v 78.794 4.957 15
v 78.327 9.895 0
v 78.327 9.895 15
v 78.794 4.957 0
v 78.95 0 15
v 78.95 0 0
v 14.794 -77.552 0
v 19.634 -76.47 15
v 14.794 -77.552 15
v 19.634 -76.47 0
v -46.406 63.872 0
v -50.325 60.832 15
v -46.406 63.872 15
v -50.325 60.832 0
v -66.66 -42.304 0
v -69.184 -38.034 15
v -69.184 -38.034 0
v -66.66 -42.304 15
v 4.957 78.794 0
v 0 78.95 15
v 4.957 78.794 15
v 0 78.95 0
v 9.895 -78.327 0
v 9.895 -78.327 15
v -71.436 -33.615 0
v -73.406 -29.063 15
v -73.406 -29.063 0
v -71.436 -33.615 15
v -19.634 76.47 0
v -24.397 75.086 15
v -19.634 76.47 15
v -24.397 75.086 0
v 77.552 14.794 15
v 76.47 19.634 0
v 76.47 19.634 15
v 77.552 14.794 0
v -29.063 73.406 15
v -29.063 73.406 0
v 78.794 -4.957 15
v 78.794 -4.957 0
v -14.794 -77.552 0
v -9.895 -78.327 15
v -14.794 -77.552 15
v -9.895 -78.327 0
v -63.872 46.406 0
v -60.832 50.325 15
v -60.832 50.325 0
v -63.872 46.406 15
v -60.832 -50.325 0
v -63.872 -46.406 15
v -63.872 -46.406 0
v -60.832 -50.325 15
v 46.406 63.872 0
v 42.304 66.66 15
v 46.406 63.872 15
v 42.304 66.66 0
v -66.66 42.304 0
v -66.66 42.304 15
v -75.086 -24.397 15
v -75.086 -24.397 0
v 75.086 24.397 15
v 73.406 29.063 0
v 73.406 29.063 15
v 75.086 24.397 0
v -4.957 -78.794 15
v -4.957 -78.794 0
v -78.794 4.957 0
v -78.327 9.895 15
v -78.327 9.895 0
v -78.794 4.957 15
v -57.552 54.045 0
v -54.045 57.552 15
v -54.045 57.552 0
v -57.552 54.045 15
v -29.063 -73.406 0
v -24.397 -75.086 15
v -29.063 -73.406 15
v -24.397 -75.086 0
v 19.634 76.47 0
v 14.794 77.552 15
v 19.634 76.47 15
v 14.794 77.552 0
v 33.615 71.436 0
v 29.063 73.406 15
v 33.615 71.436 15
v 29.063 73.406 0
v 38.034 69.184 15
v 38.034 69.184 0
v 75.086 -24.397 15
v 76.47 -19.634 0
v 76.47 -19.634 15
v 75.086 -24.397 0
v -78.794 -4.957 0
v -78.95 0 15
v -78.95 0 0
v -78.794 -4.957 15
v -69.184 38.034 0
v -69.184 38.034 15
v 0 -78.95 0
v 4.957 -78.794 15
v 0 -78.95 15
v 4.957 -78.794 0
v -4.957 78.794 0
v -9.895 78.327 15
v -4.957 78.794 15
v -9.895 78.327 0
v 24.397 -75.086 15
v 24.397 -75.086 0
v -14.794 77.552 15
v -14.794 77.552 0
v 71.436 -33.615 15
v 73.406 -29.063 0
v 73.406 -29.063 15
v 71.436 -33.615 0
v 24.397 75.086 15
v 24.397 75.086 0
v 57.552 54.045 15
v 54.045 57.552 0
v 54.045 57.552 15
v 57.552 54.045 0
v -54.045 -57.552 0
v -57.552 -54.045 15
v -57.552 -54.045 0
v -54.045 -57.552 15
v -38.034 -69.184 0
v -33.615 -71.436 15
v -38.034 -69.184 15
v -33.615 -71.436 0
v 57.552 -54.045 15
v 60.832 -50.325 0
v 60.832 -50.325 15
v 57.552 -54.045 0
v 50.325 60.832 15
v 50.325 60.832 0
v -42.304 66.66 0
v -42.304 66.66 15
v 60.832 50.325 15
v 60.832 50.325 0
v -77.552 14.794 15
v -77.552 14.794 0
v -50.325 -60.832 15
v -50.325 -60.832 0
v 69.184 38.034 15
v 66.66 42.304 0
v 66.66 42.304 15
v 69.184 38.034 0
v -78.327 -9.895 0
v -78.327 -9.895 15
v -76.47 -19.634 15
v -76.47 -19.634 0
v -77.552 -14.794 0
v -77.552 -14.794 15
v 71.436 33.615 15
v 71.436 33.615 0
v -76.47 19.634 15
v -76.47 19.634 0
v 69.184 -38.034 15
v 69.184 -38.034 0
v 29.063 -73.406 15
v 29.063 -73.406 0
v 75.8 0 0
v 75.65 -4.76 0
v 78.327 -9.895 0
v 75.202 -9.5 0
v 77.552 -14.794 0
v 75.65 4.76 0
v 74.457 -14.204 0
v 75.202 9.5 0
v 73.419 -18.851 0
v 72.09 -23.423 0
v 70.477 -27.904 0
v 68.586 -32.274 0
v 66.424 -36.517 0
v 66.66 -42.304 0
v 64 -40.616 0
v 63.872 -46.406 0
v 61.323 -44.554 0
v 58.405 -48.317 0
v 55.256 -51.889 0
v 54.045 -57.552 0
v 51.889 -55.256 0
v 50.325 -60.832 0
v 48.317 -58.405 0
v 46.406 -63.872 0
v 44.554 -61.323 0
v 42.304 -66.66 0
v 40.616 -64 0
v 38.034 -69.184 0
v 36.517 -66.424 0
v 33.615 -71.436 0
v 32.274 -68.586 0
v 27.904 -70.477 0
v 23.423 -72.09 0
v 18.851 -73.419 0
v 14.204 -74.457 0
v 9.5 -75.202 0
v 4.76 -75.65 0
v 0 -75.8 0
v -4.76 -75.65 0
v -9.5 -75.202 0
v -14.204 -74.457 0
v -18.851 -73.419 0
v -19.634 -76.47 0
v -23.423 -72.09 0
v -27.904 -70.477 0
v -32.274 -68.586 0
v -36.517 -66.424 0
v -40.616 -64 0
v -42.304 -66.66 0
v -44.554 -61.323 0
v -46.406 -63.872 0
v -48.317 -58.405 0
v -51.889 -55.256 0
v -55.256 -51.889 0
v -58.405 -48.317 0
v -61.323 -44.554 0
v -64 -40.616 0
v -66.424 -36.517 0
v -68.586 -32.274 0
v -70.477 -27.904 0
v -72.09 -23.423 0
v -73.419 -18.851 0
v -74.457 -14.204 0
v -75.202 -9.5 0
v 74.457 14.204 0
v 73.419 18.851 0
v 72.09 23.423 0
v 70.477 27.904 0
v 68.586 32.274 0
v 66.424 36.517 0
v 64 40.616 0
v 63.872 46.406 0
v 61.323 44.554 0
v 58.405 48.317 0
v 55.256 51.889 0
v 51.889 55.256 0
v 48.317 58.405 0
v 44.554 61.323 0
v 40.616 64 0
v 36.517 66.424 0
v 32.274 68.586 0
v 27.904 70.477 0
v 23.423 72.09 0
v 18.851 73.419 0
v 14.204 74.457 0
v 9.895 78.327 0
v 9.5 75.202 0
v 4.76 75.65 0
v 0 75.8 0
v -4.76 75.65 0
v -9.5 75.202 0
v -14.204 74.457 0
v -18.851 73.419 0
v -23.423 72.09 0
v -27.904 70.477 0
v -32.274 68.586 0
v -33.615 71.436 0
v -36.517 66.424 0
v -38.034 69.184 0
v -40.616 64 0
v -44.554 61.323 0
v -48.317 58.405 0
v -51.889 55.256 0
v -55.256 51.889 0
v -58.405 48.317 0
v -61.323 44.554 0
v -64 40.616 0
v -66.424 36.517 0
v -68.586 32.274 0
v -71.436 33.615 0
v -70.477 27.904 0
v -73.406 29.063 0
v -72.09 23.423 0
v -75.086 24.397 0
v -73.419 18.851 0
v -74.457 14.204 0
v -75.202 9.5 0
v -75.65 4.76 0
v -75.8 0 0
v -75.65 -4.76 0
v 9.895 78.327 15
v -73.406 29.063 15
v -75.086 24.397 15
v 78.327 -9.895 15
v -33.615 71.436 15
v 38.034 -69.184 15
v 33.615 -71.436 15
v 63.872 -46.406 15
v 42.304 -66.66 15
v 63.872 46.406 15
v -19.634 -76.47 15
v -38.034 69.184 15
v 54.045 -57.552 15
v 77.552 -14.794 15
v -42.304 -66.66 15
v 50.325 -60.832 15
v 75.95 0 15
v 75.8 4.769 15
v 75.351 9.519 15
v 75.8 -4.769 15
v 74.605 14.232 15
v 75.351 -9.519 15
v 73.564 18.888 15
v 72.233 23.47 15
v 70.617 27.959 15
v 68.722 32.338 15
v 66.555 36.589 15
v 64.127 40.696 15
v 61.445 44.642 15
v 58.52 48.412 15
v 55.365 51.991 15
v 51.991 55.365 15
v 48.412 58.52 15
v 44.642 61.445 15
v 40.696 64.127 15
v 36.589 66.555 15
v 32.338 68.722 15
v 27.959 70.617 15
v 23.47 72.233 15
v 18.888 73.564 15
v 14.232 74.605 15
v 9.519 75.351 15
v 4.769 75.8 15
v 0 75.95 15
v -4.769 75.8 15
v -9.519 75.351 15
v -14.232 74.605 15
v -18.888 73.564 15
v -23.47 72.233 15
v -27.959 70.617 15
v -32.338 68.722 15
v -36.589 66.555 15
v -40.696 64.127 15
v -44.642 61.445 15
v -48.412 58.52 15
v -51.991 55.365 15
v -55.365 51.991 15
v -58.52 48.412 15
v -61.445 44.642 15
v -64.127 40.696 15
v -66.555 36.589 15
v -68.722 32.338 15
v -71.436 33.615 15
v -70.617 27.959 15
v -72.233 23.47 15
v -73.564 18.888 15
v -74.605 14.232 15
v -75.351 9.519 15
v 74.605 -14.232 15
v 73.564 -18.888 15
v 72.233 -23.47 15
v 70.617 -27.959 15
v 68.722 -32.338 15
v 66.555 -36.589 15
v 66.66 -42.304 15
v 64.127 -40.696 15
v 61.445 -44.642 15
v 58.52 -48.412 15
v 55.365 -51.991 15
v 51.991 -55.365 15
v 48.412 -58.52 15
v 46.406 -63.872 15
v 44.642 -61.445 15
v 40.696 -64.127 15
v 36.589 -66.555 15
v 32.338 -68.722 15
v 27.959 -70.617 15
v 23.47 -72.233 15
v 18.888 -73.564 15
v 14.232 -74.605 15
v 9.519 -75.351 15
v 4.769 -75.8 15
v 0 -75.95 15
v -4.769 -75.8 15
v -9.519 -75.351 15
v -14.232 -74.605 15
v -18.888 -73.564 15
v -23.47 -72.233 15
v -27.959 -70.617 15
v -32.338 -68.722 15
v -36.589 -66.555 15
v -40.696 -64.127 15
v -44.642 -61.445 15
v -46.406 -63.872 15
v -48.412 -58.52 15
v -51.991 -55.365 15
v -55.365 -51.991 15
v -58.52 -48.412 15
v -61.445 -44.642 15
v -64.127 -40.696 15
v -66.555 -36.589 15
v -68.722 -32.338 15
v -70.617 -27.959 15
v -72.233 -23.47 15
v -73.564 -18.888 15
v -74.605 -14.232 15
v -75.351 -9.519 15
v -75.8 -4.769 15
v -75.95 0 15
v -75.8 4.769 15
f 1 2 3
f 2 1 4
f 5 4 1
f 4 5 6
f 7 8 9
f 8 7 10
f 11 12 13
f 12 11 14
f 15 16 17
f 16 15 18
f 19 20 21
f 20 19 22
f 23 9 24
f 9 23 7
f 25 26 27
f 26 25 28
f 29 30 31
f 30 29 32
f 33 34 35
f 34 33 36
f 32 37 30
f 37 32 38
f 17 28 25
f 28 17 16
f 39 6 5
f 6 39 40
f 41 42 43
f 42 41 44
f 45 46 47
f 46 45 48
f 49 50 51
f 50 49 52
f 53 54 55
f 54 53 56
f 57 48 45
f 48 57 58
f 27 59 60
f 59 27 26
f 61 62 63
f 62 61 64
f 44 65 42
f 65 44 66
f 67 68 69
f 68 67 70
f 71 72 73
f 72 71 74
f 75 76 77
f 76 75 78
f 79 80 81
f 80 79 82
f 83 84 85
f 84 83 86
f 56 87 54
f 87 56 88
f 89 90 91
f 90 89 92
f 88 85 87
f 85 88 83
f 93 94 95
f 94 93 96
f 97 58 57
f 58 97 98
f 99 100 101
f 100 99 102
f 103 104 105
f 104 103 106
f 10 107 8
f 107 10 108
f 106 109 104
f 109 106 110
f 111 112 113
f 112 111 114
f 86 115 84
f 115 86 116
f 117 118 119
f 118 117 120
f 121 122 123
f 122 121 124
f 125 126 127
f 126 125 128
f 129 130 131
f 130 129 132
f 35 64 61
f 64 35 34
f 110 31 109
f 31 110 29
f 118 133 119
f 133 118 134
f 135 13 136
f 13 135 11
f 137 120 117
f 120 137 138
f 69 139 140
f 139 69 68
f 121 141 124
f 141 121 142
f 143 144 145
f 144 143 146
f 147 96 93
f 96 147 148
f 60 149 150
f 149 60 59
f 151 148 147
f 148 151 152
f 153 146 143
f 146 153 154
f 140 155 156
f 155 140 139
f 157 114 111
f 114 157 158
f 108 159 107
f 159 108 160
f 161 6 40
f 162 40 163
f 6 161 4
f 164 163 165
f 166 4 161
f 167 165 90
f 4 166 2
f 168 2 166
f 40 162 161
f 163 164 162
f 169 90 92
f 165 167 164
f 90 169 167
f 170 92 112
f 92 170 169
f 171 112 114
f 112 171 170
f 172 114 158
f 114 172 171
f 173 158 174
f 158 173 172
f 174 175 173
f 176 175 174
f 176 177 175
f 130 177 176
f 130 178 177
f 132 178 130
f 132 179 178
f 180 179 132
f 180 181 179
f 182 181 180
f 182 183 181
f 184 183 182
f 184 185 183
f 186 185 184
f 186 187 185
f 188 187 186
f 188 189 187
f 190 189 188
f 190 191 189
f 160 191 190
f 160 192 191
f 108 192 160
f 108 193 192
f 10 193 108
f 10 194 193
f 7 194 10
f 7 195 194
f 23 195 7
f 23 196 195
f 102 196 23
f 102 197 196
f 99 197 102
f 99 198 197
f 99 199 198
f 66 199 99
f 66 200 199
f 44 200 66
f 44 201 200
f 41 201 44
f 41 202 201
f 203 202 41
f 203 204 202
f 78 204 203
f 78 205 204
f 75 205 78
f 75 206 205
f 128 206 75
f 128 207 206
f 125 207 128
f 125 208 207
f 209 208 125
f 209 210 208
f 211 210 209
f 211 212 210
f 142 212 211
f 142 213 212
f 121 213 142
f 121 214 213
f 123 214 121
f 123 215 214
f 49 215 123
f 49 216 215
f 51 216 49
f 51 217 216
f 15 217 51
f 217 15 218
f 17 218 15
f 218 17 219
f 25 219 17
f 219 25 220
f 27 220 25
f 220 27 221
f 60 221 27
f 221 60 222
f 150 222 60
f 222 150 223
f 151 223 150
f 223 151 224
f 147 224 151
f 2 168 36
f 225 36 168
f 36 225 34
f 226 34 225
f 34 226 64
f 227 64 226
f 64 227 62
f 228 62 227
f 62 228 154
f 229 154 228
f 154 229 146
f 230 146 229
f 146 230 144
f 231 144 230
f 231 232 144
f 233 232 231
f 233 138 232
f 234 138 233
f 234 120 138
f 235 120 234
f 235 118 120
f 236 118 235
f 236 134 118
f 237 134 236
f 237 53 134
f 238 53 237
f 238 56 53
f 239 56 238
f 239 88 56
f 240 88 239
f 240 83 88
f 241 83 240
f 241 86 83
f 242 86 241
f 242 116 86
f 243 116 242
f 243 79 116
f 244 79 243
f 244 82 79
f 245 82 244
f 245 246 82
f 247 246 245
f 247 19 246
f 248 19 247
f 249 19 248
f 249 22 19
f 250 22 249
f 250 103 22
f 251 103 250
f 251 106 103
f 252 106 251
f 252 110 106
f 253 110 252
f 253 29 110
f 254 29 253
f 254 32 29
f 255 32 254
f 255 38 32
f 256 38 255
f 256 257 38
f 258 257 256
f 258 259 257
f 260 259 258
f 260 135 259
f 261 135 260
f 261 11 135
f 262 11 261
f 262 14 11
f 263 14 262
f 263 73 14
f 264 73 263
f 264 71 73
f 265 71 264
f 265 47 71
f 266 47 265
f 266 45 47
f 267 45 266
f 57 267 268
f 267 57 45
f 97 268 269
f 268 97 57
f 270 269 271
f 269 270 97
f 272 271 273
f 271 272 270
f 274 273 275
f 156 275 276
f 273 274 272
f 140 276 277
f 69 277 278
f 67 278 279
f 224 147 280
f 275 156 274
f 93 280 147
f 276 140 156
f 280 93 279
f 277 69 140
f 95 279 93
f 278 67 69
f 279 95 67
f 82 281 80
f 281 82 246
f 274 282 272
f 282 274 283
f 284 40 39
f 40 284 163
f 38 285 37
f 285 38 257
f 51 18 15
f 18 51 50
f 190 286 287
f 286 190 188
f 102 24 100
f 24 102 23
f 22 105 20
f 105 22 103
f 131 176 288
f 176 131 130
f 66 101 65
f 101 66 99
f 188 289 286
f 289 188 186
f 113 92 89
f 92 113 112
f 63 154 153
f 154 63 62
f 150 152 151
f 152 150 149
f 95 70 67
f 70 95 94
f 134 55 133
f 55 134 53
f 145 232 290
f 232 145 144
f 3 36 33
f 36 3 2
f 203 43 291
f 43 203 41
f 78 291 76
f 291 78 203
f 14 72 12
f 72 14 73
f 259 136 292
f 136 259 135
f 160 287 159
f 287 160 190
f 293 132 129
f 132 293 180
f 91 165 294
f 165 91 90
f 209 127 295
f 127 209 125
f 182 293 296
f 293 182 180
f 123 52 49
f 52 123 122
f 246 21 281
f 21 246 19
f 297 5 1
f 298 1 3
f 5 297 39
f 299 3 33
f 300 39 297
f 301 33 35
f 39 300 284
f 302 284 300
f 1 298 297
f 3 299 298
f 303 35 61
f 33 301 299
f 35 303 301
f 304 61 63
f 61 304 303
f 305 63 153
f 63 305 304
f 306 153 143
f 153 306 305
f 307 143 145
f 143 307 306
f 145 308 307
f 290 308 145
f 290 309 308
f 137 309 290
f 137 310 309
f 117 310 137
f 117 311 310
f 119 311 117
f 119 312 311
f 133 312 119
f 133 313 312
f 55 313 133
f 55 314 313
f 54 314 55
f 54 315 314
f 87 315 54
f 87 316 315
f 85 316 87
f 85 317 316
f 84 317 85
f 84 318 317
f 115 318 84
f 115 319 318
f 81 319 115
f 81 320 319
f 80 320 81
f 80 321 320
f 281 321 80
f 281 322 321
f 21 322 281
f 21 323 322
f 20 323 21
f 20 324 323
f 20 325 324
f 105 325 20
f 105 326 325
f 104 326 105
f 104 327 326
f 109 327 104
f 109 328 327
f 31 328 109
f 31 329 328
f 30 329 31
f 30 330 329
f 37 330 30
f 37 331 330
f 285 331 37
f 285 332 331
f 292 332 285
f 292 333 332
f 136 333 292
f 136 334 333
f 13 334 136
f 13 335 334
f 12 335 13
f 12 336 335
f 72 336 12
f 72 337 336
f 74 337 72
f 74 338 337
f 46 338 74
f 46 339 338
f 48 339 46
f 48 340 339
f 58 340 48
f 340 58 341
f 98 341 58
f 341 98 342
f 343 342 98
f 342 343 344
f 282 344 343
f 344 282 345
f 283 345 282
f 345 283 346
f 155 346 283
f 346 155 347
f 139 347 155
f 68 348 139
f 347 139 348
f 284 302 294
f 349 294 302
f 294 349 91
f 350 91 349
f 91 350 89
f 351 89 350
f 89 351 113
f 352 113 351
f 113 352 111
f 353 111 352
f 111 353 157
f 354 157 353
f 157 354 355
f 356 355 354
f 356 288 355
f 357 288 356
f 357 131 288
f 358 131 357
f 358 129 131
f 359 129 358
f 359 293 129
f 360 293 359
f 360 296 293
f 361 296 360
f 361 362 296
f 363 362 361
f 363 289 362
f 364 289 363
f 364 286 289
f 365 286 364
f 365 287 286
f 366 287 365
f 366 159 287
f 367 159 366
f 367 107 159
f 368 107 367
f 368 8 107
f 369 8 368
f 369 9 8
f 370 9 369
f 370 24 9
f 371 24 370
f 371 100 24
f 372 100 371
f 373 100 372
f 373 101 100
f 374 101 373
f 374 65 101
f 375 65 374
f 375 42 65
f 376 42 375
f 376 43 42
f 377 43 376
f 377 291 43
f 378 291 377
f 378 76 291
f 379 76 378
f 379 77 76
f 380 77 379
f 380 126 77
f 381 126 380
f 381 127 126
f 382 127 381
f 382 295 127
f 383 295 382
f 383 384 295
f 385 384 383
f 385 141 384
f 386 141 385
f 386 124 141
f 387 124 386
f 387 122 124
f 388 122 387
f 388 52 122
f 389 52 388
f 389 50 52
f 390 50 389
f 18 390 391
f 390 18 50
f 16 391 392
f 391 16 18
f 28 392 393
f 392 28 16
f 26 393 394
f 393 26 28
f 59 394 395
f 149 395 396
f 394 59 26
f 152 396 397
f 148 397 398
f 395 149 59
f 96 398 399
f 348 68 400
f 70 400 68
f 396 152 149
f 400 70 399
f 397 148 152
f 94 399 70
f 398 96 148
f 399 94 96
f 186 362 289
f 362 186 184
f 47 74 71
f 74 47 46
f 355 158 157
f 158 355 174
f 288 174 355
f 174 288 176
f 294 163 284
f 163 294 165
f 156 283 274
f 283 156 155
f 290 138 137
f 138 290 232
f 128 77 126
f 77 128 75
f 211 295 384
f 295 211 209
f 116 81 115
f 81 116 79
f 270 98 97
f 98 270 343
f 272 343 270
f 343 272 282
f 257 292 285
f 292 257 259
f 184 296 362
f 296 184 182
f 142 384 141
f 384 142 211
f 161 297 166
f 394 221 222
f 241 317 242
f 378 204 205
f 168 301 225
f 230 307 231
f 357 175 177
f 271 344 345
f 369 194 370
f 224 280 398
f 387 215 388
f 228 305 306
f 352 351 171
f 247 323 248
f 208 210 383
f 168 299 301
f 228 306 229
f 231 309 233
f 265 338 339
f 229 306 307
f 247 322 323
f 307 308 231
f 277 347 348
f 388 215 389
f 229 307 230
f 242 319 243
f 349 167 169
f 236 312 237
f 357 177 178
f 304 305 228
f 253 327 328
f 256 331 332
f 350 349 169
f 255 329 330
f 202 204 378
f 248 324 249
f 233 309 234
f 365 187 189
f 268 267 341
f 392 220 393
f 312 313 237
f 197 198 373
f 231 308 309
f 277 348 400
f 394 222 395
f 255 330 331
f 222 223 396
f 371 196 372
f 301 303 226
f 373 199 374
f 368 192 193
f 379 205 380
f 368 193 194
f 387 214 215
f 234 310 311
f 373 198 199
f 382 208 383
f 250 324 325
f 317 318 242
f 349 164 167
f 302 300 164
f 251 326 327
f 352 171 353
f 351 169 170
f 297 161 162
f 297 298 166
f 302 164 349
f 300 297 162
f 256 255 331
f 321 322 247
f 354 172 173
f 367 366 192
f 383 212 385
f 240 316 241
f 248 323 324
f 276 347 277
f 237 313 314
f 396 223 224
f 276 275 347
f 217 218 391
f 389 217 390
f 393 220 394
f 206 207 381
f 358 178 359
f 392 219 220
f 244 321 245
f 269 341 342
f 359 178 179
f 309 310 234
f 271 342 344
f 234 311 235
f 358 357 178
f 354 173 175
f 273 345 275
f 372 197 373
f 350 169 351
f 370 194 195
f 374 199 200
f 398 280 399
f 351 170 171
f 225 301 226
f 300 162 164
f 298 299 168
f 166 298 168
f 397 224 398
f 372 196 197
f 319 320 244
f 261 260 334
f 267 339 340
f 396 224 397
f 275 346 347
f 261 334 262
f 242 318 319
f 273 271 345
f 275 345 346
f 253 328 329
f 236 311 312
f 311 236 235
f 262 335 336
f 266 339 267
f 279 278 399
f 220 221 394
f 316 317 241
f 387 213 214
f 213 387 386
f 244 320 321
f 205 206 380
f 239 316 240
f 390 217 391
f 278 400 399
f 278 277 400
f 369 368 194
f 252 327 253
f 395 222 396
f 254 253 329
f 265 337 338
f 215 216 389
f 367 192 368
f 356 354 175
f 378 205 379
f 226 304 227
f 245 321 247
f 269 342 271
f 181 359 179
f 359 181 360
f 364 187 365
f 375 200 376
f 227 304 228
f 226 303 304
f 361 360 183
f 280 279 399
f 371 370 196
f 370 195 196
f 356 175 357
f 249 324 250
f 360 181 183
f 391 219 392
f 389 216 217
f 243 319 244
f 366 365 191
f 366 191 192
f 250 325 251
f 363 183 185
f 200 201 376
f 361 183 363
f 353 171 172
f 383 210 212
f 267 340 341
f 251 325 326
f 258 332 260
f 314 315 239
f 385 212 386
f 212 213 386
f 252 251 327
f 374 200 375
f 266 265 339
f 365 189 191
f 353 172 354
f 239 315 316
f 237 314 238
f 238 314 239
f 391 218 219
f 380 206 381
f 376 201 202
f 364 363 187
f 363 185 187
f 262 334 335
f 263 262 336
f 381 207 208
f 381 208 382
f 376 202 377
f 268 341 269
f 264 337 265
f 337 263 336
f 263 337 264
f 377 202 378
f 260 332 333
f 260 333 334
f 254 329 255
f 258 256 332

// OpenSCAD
$fn = 100;
minimal_mass_rohr = 149.2; //148.7 bei 30mm, 149.2 bei 15mm
maximal_mass_rohr = 149.5;
spalt_flies = 1.2;
ring_dicke = 3;
ring_hoehe = 15;  //Maximale Höhe 30mm

minimal_mass_ring = (minimal_mass_rohr / 2) + spalt_flies;
maximal_mass_ring = (maximal_mass_rohr / 2) + spalt_flies;

difference() {
    cylinder(h = ring_hoehe, r = maximal_mass_ring + ring_dicke);
    cylinder(ring_hoehe, minimal_mass_ring, maximal_mass_ring);
}
